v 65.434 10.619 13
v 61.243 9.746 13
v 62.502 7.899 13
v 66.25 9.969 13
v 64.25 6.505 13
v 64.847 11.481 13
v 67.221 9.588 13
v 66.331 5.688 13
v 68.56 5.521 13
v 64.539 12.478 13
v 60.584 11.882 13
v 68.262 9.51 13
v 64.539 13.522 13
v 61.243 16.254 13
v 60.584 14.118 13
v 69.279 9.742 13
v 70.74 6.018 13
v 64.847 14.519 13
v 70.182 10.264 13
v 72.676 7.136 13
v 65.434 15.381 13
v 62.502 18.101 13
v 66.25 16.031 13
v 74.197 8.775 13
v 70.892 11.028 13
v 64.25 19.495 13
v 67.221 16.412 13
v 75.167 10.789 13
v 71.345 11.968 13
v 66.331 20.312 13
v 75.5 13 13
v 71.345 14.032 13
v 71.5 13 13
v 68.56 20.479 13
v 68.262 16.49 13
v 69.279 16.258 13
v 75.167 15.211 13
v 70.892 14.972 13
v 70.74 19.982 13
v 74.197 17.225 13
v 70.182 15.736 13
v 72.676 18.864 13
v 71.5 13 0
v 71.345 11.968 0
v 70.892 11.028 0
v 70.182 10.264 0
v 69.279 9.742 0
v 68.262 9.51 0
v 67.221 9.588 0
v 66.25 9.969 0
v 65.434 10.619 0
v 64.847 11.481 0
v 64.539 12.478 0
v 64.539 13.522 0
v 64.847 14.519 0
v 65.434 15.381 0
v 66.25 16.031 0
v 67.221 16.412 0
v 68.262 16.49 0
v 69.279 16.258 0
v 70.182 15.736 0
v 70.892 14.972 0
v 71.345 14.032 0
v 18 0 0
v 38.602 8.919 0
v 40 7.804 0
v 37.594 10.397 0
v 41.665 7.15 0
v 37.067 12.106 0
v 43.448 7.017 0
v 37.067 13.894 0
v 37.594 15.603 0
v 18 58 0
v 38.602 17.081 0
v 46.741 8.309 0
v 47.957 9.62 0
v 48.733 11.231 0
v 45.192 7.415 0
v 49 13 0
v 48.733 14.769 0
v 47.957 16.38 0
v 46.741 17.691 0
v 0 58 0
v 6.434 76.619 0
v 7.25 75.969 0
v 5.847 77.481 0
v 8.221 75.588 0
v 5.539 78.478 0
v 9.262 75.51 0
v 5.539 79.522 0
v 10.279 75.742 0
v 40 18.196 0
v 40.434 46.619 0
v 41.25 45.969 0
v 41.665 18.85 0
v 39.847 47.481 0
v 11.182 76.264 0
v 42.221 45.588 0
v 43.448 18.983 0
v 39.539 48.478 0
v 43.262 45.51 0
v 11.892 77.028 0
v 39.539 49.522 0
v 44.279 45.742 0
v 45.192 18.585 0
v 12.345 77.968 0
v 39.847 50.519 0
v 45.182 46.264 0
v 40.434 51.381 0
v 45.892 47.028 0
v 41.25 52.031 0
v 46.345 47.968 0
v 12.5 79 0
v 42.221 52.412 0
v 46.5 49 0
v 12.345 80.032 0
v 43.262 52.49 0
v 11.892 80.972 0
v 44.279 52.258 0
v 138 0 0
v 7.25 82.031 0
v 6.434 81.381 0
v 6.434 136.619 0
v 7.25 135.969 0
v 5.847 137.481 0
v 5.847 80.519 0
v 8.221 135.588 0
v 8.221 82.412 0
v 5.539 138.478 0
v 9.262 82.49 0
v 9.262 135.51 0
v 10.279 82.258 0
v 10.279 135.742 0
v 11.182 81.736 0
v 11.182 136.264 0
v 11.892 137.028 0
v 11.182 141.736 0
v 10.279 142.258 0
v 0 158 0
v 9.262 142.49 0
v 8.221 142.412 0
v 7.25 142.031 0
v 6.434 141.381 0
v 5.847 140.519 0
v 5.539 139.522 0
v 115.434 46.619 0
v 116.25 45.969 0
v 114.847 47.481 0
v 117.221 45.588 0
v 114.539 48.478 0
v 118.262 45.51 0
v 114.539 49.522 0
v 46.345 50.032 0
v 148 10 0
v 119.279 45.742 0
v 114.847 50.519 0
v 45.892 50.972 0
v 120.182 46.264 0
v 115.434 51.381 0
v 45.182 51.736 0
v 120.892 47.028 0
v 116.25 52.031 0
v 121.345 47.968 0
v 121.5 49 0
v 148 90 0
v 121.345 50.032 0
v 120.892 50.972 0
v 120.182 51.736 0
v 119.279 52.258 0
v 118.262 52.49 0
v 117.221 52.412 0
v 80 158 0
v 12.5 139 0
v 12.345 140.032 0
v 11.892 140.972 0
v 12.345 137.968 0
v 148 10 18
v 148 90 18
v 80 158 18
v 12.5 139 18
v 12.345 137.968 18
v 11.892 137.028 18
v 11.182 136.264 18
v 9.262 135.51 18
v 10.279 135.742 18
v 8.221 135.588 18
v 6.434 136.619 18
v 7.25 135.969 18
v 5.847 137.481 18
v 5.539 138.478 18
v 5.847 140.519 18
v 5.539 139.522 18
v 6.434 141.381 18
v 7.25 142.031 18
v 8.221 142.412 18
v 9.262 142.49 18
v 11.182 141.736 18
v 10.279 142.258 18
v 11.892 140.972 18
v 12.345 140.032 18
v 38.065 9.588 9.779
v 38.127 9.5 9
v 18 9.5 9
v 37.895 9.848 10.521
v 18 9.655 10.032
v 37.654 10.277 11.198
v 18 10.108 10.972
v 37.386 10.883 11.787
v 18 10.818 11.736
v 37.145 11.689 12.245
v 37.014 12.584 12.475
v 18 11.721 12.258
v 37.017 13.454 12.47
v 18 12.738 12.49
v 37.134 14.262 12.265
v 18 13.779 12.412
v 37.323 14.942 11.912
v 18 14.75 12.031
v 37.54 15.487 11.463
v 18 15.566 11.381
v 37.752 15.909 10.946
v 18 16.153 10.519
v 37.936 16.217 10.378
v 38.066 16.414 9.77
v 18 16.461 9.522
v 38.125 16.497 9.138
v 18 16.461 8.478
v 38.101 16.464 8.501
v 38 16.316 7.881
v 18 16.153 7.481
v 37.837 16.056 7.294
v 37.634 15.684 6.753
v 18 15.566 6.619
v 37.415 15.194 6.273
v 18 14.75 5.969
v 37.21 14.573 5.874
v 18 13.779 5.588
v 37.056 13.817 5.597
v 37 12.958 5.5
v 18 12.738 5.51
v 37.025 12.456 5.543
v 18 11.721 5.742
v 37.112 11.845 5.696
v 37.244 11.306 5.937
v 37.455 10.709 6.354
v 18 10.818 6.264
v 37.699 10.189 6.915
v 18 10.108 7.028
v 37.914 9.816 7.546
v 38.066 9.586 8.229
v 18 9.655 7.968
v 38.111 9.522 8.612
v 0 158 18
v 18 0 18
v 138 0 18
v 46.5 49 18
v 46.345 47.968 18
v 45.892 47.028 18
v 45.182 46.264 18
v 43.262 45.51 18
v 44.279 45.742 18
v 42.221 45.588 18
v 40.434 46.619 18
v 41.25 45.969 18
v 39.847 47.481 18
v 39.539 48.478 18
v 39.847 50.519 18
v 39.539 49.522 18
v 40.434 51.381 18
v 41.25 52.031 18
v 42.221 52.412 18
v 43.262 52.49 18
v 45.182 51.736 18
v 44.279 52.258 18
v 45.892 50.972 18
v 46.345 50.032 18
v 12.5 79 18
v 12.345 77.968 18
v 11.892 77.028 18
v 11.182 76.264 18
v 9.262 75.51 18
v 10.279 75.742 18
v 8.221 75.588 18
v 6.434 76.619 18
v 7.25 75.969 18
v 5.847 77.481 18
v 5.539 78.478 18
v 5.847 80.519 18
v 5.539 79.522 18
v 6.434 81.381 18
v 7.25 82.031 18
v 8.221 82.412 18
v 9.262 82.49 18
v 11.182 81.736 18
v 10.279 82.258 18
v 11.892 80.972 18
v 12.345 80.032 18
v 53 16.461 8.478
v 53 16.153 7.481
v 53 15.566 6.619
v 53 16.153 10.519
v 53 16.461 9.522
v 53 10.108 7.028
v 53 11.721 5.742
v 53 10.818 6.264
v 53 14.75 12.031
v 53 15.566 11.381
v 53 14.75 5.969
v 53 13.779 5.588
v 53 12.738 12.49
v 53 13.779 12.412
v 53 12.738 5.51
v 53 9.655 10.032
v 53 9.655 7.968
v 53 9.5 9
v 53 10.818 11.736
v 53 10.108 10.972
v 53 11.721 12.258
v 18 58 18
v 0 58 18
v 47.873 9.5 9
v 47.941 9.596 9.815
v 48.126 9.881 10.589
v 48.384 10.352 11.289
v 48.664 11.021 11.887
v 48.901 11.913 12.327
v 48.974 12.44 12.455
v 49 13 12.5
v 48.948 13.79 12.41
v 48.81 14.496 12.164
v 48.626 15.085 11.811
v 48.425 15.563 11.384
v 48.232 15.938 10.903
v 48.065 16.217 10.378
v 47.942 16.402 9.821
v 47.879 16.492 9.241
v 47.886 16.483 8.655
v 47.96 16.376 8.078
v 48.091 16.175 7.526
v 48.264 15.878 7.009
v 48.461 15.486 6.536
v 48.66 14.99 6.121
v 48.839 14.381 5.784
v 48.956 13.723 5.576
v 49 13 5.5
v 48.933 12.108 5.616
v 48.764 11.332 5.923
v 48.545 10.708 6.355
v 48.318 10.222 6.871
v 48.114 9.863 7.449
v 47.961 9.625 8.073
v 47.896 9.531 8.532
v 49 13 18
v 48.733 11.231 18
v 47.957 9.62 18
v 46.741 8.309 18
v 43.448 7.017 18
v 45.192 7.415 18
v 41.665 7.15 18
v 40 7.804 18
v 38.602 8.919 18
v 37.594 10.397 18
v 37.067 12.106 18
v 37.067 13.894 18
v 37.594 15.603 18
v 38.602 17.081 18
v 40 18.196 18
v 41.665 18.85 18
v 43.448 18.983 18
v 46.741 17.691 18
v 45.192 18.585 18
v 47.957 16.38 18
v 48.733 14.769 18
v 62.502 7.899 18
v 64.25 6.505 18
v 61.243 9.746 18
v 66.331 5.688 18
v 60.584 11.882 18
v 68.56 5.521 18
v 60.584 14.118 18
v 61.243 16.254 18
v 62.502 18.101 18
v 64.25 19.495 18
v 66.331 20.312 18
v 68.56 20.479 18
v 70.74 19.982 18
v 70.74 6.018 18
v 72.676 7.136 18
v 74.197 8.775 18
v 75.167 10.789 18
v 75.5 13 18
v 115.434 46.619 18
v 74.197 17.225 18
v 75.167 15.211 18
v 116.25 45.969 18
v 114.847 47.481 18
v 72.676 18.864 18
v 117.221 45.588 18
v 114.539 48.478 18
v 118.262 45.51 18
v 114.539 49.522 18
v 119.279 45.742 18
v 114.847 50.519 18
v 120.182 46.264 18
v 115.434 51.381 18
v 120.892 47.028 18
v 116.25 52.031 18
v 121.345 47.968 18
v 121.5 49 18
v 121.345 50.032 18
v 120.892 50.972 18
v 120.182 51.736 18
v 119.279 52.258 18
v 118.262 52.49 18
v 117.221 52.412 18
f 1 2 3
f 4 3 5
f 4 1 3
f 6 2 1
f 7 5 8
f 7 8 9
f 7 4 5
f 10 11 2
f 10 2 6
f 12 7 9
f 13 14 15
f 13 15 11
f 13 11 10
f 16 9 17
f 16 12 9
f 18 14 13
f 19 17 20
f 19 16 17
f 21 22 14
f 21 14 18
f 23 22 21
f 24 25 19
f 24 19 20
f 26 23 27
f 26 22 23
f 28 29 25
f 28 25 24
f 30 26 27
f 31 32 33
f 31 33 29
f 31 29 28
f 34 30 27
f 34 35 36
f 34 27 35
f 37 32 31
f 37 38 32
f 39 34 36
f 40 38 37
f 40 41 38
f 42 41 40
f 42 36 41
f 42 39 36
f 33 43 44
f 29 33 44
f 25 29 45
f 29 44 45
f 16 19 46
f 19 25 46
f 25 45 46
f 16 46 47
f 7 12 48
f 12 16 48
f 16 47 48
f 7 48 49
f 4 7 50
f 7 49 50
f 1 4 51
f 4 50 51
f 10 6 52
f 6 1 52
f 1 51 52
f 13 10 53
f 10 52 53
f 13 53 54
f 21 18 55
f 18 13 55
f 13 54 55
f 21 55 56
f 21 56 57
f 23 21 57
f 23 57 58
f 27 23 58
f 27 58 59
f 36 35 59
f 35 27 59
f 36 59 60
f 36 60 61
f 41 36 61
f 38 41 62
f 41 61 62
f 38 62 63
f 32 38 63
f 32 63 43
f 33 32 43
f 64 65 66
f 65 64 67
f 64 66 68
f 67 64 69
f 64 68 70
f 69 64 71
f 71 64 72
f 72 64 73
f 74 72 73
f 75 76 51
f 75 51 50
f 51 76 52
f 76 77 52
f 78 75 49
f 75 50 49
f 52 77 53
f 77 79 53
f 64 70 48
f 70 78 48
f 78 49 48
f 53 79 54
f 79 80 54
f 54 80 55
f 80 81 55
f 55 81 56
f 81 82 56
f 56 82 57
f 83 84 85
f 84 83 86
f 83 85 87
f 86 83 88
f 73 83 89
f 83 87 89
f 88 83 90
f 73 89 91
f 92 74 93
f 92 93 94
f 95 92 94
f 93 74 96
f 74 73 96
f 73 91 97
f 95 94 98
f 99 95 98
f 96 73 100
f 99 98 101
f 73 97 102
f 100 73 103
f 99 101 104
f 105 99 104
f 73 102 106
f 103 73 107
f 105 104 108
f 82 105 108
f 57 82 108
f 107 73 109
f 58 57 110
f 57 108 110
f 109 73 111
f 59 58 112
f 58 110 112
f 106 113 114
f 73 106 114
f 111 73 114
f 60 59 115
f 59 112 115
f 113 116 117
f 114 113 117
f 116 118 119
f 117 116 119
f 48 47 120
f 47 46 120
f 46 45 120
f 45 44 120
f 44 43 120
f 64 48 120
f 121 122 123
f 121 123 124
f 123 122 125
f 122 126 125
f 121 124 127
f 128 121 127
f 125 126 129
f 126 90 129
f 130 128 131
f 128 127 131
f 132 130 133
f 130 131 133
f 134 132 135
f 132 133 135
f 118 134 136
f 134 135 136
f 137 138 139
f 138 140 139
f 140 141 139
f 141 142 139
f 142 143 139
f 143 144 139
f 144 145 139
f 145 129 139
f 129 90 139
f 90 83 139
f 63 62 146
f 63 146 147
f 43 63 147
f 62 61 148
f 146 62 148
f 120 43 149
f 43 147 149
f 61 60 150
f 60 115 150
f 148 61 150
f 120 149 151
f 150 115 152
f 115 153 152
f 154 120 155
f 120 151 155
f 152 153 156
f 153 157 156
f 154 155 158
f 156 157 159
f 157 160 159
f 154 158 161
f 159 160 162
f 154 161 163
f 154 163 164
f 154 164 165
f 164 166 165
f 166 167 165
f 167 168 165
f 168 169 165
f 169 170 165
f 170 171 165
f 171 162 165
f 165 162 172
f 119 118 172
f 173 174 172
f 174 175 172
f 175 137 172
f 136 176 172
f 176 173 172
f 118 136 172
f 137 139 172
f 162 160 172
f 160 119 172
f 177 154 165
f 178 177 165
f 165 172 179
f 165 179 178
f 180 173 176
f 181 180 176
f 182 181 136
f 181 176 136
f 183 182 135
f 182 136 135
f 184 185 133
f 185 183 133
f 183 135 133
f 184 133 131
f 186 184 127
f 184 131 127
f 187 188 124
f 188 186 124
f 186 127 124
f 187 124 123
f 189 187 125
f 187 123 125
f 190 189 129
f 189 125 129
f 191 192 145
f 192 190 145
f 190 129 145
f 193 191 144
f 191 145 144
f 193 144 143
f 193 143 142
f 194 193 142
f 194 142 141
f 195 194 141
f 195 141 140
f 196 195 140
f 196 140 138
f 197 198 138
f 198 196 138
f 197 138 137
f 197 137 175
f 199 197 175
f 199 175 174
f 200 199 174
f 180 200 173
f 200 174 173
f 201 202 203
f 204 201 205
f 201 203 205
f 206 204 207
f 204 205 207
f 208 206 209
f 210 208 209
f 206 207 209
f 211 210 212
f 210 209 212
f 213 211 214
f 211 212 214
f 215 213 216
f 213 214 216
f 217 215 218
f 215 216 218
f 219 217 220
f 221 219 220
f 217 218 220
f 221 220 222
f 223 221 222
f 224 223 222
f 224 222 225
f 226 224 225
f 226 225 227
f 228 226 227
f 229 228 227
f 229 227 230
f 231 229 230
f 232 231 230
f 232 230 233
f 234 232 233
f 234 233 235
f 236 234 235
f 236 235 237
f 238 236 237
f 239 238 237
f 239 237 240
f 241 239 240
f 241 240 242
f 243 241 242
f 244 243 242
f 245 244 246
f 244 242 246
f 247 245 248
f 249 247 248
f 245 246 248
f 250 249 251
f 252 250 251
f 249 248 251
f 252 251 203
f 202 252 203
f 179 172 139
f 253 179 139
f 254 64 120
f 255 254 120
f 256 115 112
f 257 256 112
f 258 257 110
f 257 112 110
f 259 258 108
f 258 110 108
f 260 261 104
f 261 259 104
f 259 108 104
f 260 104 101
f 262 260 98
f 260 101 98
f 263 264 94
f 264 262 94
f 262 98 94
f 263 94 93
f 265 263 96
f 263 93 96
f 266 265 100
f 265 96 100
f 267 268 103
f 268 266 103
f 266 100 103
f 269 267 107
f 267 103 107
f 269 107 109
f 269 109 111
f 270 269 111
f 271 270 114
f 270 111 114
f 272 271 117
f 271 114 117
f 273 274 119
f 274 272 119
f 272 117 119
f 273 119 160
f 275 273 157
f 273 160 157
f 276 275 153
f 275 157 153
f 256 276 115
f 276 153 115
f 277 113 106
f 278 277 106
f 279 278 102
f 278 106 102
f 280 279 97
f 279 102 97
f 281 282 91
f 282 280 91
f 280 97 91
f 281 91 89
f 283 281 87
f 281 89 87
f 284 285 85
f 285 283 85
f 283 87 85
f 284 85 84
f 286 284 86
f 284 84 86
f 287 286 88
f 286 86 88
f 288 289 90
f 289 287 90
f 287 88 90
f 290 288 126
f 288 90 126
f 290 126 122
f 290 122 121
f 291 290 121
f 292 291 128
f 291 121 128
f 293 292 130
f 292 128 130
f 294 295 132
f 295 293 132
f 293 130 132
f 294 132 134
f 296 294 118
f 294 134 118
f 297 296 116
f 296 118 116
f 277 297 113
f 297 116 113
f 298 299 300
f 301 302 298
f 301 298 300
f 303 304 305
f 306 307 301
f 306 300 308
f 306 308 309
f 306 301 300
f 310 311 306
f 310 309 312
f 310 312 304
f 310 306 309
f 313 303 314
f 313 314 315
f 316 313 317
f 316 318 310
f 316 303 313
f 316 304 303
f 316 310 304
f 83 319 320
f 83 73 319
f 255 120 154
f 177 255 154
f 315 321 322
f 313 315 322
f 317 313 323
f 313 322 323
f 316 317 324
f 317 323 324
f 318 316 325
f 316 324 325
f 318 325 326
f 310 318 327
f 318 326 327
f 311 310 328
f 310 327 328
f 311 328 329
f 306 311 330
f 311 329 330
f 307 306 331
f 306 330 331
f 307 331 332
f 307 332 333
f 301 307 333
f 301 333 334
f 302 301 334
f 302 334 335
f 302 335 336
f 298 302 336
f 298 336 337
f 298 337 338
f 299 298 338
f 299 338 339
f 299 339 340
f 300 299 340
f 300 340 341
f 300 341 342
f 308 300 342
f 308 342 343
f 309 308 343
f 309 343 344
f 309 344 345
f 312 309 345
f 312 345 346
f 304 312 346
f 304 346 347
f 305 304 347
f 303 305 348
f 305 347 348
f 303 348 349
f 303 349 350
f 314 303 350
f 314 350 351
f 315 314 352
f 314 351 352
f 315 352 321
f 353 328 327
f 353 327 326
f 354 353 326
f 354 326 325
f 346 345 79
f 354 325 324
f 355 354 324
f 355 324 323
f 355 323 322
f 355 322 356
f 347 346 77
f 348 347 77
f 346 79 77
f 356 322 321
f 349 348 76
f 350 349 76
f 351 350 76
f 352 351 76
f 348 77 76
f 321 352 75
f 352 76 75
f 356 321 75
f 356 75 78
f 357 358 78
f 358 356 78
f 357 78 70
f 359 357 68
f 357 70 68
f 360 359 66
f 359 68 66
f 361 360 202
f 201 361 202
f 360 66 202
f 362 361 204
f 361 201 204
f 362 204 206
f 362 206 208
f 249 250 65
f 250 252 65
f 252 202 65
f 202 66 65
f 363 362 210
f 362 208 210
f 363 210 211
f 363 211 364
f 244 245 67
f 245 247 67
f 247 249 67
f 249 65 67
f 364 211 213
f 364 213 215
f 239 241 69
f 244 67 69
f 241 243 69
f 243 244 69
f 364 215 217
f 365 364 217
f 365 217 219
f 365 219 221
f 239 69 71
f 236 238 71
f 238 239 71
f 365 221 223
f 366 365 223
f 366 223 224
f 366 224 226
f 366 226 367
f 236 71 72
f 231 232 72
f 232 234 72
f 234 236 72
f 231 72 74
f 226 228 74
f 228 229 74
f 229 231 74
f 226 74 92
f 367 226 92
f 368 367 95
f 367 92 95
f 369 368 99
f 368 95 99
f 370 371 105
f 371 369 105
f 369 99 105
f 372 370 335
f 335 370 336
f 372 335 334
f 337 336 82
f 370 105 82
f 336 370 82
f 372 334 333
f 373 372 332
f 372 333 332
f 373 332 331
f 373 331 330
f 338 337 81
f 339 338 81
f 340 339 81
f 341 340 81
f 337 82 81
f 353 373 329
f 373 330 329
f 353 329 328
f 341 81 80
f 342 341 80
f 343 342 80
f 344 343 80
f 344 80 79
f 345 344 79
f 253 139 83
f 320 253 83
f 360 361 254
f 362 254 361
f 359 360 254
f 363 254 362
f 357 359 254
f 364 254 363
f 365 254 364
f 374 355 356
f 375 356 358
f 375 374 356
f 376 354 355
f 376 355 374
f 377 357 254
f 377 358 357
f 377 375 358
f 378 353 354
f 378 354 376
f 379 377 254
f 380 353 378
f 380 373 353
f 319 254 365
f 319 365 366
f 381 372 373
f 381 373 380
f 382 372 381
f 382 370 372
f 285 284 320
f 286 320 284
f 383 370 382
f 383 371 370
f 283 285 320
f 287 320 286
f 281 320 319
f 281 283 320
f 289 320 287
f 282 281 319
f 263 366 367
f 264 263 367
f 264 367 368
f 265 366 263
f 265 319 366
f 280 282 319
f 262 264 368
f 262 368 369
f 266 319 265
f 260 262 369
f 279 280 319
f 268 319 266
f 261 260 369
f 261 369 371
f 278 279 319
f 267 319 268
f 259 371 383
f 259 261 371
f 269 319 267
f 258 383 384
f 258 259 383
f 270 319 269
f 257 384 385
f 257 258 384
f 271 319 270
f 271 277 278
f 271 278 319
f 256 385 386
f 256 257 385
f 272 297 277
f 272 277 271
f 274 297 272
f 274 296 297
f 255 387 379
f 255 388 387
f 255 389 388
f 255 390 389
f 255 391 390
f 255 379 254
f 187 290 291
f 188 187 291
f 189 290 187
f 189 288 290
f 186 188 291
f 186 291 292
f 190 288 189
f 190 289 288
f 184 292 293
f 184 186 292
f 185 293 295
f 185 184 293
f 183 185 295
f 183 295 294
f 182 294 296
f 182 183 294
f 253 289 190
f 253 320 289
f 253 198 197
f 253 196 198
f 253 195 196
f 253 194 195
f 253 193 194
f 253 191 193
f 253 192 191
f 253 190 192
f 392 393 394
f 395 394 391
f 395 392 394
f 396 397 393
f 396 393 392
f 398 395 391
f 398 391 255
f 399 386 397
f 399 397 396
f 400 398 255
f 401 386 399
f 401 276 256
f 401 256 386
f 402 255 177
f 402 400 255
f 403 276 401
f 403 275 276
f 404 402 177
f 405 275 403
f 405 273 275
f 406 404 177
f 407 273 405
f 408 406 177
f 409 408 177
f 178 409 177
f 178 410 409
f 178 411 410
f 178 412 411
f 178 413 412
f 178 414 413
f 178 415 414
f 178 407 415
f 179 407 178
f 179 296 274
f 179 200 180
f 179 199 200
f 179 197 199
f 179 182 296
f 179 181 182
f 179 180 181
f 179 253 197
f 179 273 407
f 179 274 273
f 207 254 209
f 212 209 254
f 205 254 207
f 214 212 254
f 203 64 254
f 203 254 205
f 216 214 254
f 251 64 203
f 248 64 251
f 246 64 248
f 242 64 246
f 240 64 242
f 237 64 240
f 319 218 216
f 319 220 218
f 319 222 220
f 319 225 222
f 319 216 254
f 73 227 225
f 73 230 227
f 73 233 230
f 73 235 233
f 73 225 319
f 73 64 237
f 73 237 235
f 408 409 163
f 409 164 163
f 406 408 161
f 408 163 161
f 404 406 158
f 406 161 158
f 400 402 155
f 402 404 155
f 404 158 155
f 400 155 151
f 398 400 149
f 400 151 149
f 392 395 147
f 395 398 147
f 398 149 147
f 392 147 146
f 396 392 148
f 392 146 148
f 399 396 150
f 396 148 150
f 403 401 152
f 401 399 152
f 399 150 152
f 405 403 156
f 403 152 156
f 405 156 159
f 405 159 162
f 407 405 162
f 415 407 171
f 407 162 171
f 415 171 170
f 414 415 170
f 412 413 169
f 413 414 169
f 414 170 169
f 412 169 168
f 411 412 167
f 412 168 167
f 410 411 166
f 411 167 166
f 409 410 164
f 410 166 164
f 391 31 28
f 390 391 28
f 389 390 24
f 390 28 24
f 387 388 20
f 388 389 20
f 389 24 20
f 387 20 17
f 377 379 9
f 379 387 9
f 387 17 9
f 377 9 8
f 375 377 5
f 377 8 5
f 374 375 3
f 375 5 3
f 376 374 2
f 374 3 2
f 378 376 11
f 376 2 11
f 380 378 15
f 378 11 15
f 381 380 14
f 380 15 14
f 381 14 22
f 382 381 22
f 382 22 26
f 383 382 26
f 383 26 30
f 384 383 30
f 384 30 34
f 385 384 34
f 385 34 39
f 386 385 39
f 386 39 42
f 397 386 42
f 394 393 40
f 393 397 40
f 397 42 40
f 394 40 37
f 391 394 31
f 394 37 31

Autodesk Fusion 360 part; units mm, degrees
sketch "Top" plane through (0, 0, 0) normal (0, 0, 1) x (1, 0, 0)
  line L0 (18, 0) -> (138.0004, 0)
  line L1 (148.0004, 10) -> (148.0004, 90)
  line L2 (80.0004, 158) -> (0, 158)
  line L3 (0, 158) -> (0, 58)
  line L4 (18, 0) -> (18, 58)
  line L5 (18, 58) -> (0, 58)
  line L6 (138.0004, 0) -> (148.0004, 10)
  line L7 (80.0004, 158) -> (148.0004, 90)
  line L8 (9, 58) -> (9, 158) construction
  line L9 (18, 49) -> (148.0004, 49) construction
  line L10 (18, 13) -> (148.0004, 13) construction
  line L11 (43, 0) -> (43, 65) construction
  circle A0 centre (9, 79) radius 3.5
  circle A1 centre (9, 139) radius 3.5
  circle A2 centre (43, 49) radius 3.5
  circle A3 centre (118, 49) radius 3.5
  circle A4 centre (43, 13) radius 6
  circle A5 centre (68, 13) radius 3.5
  circle A6 centre (68, 13) radius 7.5
  dimension "d1" = 158
  dimension "d3" = 58
  dimension "d4" = 18
  dimension "d5" = 10
  dimension "d6" = 10
  dimension "d7" = 68
  dimension "d8" = 68
  dimension "d9" = 9
  dimension "d10" = 49
  dimension "d11" = 13
  dimension "d12" = 25
  dimension "d13" = 7
  dimension "d14" = 7
  dimension "d15" = 7
  dimension "d16" = 7
  dimension "d17" = 12
  dimension "d18" = 7
  dimension "d19" = 15
  dimension "d20" = 60
  dimension "d21" = 21
  dimension "d22" = 75
  dimension "d23" = 25
extrude "Extrude1" add sketch "Top" along normal blind 13 contours A6
extrude "Extrude2" add sketch "Top" along normal blind 18 contours L0 L1 L2 L3 L4 L5 L6 L7
sketch "Side" plane through (18, 0, 0) normal (-1, 0, 0) x (0, -1, 0)
  line L0 (-58, 0) -> (0, 0)
  line L1 (0, 0) -> (0, 18)
  line L2 (0, 18) -> (-58, 18)
  line L3 (-58, 18) -> (-58, 0)
  line L4 (0, 0) -> (-58, 0) construction
  line L5 (-58, 0) -> (-58, 18) construction
  line L6 (-58, 18) -> (0, 18) construction
  line L7 (0, 18) -> (0, 0) construction
  line L8 (0, 9) -> (-58, 9) construction
  circle A0 centre (-13, 9) radius 3.5
  dimension "d28" = 7
  dimension "d29" = 13
extrude "Extrude3" cut sketch "Side" against normal blind 35 contours A0
